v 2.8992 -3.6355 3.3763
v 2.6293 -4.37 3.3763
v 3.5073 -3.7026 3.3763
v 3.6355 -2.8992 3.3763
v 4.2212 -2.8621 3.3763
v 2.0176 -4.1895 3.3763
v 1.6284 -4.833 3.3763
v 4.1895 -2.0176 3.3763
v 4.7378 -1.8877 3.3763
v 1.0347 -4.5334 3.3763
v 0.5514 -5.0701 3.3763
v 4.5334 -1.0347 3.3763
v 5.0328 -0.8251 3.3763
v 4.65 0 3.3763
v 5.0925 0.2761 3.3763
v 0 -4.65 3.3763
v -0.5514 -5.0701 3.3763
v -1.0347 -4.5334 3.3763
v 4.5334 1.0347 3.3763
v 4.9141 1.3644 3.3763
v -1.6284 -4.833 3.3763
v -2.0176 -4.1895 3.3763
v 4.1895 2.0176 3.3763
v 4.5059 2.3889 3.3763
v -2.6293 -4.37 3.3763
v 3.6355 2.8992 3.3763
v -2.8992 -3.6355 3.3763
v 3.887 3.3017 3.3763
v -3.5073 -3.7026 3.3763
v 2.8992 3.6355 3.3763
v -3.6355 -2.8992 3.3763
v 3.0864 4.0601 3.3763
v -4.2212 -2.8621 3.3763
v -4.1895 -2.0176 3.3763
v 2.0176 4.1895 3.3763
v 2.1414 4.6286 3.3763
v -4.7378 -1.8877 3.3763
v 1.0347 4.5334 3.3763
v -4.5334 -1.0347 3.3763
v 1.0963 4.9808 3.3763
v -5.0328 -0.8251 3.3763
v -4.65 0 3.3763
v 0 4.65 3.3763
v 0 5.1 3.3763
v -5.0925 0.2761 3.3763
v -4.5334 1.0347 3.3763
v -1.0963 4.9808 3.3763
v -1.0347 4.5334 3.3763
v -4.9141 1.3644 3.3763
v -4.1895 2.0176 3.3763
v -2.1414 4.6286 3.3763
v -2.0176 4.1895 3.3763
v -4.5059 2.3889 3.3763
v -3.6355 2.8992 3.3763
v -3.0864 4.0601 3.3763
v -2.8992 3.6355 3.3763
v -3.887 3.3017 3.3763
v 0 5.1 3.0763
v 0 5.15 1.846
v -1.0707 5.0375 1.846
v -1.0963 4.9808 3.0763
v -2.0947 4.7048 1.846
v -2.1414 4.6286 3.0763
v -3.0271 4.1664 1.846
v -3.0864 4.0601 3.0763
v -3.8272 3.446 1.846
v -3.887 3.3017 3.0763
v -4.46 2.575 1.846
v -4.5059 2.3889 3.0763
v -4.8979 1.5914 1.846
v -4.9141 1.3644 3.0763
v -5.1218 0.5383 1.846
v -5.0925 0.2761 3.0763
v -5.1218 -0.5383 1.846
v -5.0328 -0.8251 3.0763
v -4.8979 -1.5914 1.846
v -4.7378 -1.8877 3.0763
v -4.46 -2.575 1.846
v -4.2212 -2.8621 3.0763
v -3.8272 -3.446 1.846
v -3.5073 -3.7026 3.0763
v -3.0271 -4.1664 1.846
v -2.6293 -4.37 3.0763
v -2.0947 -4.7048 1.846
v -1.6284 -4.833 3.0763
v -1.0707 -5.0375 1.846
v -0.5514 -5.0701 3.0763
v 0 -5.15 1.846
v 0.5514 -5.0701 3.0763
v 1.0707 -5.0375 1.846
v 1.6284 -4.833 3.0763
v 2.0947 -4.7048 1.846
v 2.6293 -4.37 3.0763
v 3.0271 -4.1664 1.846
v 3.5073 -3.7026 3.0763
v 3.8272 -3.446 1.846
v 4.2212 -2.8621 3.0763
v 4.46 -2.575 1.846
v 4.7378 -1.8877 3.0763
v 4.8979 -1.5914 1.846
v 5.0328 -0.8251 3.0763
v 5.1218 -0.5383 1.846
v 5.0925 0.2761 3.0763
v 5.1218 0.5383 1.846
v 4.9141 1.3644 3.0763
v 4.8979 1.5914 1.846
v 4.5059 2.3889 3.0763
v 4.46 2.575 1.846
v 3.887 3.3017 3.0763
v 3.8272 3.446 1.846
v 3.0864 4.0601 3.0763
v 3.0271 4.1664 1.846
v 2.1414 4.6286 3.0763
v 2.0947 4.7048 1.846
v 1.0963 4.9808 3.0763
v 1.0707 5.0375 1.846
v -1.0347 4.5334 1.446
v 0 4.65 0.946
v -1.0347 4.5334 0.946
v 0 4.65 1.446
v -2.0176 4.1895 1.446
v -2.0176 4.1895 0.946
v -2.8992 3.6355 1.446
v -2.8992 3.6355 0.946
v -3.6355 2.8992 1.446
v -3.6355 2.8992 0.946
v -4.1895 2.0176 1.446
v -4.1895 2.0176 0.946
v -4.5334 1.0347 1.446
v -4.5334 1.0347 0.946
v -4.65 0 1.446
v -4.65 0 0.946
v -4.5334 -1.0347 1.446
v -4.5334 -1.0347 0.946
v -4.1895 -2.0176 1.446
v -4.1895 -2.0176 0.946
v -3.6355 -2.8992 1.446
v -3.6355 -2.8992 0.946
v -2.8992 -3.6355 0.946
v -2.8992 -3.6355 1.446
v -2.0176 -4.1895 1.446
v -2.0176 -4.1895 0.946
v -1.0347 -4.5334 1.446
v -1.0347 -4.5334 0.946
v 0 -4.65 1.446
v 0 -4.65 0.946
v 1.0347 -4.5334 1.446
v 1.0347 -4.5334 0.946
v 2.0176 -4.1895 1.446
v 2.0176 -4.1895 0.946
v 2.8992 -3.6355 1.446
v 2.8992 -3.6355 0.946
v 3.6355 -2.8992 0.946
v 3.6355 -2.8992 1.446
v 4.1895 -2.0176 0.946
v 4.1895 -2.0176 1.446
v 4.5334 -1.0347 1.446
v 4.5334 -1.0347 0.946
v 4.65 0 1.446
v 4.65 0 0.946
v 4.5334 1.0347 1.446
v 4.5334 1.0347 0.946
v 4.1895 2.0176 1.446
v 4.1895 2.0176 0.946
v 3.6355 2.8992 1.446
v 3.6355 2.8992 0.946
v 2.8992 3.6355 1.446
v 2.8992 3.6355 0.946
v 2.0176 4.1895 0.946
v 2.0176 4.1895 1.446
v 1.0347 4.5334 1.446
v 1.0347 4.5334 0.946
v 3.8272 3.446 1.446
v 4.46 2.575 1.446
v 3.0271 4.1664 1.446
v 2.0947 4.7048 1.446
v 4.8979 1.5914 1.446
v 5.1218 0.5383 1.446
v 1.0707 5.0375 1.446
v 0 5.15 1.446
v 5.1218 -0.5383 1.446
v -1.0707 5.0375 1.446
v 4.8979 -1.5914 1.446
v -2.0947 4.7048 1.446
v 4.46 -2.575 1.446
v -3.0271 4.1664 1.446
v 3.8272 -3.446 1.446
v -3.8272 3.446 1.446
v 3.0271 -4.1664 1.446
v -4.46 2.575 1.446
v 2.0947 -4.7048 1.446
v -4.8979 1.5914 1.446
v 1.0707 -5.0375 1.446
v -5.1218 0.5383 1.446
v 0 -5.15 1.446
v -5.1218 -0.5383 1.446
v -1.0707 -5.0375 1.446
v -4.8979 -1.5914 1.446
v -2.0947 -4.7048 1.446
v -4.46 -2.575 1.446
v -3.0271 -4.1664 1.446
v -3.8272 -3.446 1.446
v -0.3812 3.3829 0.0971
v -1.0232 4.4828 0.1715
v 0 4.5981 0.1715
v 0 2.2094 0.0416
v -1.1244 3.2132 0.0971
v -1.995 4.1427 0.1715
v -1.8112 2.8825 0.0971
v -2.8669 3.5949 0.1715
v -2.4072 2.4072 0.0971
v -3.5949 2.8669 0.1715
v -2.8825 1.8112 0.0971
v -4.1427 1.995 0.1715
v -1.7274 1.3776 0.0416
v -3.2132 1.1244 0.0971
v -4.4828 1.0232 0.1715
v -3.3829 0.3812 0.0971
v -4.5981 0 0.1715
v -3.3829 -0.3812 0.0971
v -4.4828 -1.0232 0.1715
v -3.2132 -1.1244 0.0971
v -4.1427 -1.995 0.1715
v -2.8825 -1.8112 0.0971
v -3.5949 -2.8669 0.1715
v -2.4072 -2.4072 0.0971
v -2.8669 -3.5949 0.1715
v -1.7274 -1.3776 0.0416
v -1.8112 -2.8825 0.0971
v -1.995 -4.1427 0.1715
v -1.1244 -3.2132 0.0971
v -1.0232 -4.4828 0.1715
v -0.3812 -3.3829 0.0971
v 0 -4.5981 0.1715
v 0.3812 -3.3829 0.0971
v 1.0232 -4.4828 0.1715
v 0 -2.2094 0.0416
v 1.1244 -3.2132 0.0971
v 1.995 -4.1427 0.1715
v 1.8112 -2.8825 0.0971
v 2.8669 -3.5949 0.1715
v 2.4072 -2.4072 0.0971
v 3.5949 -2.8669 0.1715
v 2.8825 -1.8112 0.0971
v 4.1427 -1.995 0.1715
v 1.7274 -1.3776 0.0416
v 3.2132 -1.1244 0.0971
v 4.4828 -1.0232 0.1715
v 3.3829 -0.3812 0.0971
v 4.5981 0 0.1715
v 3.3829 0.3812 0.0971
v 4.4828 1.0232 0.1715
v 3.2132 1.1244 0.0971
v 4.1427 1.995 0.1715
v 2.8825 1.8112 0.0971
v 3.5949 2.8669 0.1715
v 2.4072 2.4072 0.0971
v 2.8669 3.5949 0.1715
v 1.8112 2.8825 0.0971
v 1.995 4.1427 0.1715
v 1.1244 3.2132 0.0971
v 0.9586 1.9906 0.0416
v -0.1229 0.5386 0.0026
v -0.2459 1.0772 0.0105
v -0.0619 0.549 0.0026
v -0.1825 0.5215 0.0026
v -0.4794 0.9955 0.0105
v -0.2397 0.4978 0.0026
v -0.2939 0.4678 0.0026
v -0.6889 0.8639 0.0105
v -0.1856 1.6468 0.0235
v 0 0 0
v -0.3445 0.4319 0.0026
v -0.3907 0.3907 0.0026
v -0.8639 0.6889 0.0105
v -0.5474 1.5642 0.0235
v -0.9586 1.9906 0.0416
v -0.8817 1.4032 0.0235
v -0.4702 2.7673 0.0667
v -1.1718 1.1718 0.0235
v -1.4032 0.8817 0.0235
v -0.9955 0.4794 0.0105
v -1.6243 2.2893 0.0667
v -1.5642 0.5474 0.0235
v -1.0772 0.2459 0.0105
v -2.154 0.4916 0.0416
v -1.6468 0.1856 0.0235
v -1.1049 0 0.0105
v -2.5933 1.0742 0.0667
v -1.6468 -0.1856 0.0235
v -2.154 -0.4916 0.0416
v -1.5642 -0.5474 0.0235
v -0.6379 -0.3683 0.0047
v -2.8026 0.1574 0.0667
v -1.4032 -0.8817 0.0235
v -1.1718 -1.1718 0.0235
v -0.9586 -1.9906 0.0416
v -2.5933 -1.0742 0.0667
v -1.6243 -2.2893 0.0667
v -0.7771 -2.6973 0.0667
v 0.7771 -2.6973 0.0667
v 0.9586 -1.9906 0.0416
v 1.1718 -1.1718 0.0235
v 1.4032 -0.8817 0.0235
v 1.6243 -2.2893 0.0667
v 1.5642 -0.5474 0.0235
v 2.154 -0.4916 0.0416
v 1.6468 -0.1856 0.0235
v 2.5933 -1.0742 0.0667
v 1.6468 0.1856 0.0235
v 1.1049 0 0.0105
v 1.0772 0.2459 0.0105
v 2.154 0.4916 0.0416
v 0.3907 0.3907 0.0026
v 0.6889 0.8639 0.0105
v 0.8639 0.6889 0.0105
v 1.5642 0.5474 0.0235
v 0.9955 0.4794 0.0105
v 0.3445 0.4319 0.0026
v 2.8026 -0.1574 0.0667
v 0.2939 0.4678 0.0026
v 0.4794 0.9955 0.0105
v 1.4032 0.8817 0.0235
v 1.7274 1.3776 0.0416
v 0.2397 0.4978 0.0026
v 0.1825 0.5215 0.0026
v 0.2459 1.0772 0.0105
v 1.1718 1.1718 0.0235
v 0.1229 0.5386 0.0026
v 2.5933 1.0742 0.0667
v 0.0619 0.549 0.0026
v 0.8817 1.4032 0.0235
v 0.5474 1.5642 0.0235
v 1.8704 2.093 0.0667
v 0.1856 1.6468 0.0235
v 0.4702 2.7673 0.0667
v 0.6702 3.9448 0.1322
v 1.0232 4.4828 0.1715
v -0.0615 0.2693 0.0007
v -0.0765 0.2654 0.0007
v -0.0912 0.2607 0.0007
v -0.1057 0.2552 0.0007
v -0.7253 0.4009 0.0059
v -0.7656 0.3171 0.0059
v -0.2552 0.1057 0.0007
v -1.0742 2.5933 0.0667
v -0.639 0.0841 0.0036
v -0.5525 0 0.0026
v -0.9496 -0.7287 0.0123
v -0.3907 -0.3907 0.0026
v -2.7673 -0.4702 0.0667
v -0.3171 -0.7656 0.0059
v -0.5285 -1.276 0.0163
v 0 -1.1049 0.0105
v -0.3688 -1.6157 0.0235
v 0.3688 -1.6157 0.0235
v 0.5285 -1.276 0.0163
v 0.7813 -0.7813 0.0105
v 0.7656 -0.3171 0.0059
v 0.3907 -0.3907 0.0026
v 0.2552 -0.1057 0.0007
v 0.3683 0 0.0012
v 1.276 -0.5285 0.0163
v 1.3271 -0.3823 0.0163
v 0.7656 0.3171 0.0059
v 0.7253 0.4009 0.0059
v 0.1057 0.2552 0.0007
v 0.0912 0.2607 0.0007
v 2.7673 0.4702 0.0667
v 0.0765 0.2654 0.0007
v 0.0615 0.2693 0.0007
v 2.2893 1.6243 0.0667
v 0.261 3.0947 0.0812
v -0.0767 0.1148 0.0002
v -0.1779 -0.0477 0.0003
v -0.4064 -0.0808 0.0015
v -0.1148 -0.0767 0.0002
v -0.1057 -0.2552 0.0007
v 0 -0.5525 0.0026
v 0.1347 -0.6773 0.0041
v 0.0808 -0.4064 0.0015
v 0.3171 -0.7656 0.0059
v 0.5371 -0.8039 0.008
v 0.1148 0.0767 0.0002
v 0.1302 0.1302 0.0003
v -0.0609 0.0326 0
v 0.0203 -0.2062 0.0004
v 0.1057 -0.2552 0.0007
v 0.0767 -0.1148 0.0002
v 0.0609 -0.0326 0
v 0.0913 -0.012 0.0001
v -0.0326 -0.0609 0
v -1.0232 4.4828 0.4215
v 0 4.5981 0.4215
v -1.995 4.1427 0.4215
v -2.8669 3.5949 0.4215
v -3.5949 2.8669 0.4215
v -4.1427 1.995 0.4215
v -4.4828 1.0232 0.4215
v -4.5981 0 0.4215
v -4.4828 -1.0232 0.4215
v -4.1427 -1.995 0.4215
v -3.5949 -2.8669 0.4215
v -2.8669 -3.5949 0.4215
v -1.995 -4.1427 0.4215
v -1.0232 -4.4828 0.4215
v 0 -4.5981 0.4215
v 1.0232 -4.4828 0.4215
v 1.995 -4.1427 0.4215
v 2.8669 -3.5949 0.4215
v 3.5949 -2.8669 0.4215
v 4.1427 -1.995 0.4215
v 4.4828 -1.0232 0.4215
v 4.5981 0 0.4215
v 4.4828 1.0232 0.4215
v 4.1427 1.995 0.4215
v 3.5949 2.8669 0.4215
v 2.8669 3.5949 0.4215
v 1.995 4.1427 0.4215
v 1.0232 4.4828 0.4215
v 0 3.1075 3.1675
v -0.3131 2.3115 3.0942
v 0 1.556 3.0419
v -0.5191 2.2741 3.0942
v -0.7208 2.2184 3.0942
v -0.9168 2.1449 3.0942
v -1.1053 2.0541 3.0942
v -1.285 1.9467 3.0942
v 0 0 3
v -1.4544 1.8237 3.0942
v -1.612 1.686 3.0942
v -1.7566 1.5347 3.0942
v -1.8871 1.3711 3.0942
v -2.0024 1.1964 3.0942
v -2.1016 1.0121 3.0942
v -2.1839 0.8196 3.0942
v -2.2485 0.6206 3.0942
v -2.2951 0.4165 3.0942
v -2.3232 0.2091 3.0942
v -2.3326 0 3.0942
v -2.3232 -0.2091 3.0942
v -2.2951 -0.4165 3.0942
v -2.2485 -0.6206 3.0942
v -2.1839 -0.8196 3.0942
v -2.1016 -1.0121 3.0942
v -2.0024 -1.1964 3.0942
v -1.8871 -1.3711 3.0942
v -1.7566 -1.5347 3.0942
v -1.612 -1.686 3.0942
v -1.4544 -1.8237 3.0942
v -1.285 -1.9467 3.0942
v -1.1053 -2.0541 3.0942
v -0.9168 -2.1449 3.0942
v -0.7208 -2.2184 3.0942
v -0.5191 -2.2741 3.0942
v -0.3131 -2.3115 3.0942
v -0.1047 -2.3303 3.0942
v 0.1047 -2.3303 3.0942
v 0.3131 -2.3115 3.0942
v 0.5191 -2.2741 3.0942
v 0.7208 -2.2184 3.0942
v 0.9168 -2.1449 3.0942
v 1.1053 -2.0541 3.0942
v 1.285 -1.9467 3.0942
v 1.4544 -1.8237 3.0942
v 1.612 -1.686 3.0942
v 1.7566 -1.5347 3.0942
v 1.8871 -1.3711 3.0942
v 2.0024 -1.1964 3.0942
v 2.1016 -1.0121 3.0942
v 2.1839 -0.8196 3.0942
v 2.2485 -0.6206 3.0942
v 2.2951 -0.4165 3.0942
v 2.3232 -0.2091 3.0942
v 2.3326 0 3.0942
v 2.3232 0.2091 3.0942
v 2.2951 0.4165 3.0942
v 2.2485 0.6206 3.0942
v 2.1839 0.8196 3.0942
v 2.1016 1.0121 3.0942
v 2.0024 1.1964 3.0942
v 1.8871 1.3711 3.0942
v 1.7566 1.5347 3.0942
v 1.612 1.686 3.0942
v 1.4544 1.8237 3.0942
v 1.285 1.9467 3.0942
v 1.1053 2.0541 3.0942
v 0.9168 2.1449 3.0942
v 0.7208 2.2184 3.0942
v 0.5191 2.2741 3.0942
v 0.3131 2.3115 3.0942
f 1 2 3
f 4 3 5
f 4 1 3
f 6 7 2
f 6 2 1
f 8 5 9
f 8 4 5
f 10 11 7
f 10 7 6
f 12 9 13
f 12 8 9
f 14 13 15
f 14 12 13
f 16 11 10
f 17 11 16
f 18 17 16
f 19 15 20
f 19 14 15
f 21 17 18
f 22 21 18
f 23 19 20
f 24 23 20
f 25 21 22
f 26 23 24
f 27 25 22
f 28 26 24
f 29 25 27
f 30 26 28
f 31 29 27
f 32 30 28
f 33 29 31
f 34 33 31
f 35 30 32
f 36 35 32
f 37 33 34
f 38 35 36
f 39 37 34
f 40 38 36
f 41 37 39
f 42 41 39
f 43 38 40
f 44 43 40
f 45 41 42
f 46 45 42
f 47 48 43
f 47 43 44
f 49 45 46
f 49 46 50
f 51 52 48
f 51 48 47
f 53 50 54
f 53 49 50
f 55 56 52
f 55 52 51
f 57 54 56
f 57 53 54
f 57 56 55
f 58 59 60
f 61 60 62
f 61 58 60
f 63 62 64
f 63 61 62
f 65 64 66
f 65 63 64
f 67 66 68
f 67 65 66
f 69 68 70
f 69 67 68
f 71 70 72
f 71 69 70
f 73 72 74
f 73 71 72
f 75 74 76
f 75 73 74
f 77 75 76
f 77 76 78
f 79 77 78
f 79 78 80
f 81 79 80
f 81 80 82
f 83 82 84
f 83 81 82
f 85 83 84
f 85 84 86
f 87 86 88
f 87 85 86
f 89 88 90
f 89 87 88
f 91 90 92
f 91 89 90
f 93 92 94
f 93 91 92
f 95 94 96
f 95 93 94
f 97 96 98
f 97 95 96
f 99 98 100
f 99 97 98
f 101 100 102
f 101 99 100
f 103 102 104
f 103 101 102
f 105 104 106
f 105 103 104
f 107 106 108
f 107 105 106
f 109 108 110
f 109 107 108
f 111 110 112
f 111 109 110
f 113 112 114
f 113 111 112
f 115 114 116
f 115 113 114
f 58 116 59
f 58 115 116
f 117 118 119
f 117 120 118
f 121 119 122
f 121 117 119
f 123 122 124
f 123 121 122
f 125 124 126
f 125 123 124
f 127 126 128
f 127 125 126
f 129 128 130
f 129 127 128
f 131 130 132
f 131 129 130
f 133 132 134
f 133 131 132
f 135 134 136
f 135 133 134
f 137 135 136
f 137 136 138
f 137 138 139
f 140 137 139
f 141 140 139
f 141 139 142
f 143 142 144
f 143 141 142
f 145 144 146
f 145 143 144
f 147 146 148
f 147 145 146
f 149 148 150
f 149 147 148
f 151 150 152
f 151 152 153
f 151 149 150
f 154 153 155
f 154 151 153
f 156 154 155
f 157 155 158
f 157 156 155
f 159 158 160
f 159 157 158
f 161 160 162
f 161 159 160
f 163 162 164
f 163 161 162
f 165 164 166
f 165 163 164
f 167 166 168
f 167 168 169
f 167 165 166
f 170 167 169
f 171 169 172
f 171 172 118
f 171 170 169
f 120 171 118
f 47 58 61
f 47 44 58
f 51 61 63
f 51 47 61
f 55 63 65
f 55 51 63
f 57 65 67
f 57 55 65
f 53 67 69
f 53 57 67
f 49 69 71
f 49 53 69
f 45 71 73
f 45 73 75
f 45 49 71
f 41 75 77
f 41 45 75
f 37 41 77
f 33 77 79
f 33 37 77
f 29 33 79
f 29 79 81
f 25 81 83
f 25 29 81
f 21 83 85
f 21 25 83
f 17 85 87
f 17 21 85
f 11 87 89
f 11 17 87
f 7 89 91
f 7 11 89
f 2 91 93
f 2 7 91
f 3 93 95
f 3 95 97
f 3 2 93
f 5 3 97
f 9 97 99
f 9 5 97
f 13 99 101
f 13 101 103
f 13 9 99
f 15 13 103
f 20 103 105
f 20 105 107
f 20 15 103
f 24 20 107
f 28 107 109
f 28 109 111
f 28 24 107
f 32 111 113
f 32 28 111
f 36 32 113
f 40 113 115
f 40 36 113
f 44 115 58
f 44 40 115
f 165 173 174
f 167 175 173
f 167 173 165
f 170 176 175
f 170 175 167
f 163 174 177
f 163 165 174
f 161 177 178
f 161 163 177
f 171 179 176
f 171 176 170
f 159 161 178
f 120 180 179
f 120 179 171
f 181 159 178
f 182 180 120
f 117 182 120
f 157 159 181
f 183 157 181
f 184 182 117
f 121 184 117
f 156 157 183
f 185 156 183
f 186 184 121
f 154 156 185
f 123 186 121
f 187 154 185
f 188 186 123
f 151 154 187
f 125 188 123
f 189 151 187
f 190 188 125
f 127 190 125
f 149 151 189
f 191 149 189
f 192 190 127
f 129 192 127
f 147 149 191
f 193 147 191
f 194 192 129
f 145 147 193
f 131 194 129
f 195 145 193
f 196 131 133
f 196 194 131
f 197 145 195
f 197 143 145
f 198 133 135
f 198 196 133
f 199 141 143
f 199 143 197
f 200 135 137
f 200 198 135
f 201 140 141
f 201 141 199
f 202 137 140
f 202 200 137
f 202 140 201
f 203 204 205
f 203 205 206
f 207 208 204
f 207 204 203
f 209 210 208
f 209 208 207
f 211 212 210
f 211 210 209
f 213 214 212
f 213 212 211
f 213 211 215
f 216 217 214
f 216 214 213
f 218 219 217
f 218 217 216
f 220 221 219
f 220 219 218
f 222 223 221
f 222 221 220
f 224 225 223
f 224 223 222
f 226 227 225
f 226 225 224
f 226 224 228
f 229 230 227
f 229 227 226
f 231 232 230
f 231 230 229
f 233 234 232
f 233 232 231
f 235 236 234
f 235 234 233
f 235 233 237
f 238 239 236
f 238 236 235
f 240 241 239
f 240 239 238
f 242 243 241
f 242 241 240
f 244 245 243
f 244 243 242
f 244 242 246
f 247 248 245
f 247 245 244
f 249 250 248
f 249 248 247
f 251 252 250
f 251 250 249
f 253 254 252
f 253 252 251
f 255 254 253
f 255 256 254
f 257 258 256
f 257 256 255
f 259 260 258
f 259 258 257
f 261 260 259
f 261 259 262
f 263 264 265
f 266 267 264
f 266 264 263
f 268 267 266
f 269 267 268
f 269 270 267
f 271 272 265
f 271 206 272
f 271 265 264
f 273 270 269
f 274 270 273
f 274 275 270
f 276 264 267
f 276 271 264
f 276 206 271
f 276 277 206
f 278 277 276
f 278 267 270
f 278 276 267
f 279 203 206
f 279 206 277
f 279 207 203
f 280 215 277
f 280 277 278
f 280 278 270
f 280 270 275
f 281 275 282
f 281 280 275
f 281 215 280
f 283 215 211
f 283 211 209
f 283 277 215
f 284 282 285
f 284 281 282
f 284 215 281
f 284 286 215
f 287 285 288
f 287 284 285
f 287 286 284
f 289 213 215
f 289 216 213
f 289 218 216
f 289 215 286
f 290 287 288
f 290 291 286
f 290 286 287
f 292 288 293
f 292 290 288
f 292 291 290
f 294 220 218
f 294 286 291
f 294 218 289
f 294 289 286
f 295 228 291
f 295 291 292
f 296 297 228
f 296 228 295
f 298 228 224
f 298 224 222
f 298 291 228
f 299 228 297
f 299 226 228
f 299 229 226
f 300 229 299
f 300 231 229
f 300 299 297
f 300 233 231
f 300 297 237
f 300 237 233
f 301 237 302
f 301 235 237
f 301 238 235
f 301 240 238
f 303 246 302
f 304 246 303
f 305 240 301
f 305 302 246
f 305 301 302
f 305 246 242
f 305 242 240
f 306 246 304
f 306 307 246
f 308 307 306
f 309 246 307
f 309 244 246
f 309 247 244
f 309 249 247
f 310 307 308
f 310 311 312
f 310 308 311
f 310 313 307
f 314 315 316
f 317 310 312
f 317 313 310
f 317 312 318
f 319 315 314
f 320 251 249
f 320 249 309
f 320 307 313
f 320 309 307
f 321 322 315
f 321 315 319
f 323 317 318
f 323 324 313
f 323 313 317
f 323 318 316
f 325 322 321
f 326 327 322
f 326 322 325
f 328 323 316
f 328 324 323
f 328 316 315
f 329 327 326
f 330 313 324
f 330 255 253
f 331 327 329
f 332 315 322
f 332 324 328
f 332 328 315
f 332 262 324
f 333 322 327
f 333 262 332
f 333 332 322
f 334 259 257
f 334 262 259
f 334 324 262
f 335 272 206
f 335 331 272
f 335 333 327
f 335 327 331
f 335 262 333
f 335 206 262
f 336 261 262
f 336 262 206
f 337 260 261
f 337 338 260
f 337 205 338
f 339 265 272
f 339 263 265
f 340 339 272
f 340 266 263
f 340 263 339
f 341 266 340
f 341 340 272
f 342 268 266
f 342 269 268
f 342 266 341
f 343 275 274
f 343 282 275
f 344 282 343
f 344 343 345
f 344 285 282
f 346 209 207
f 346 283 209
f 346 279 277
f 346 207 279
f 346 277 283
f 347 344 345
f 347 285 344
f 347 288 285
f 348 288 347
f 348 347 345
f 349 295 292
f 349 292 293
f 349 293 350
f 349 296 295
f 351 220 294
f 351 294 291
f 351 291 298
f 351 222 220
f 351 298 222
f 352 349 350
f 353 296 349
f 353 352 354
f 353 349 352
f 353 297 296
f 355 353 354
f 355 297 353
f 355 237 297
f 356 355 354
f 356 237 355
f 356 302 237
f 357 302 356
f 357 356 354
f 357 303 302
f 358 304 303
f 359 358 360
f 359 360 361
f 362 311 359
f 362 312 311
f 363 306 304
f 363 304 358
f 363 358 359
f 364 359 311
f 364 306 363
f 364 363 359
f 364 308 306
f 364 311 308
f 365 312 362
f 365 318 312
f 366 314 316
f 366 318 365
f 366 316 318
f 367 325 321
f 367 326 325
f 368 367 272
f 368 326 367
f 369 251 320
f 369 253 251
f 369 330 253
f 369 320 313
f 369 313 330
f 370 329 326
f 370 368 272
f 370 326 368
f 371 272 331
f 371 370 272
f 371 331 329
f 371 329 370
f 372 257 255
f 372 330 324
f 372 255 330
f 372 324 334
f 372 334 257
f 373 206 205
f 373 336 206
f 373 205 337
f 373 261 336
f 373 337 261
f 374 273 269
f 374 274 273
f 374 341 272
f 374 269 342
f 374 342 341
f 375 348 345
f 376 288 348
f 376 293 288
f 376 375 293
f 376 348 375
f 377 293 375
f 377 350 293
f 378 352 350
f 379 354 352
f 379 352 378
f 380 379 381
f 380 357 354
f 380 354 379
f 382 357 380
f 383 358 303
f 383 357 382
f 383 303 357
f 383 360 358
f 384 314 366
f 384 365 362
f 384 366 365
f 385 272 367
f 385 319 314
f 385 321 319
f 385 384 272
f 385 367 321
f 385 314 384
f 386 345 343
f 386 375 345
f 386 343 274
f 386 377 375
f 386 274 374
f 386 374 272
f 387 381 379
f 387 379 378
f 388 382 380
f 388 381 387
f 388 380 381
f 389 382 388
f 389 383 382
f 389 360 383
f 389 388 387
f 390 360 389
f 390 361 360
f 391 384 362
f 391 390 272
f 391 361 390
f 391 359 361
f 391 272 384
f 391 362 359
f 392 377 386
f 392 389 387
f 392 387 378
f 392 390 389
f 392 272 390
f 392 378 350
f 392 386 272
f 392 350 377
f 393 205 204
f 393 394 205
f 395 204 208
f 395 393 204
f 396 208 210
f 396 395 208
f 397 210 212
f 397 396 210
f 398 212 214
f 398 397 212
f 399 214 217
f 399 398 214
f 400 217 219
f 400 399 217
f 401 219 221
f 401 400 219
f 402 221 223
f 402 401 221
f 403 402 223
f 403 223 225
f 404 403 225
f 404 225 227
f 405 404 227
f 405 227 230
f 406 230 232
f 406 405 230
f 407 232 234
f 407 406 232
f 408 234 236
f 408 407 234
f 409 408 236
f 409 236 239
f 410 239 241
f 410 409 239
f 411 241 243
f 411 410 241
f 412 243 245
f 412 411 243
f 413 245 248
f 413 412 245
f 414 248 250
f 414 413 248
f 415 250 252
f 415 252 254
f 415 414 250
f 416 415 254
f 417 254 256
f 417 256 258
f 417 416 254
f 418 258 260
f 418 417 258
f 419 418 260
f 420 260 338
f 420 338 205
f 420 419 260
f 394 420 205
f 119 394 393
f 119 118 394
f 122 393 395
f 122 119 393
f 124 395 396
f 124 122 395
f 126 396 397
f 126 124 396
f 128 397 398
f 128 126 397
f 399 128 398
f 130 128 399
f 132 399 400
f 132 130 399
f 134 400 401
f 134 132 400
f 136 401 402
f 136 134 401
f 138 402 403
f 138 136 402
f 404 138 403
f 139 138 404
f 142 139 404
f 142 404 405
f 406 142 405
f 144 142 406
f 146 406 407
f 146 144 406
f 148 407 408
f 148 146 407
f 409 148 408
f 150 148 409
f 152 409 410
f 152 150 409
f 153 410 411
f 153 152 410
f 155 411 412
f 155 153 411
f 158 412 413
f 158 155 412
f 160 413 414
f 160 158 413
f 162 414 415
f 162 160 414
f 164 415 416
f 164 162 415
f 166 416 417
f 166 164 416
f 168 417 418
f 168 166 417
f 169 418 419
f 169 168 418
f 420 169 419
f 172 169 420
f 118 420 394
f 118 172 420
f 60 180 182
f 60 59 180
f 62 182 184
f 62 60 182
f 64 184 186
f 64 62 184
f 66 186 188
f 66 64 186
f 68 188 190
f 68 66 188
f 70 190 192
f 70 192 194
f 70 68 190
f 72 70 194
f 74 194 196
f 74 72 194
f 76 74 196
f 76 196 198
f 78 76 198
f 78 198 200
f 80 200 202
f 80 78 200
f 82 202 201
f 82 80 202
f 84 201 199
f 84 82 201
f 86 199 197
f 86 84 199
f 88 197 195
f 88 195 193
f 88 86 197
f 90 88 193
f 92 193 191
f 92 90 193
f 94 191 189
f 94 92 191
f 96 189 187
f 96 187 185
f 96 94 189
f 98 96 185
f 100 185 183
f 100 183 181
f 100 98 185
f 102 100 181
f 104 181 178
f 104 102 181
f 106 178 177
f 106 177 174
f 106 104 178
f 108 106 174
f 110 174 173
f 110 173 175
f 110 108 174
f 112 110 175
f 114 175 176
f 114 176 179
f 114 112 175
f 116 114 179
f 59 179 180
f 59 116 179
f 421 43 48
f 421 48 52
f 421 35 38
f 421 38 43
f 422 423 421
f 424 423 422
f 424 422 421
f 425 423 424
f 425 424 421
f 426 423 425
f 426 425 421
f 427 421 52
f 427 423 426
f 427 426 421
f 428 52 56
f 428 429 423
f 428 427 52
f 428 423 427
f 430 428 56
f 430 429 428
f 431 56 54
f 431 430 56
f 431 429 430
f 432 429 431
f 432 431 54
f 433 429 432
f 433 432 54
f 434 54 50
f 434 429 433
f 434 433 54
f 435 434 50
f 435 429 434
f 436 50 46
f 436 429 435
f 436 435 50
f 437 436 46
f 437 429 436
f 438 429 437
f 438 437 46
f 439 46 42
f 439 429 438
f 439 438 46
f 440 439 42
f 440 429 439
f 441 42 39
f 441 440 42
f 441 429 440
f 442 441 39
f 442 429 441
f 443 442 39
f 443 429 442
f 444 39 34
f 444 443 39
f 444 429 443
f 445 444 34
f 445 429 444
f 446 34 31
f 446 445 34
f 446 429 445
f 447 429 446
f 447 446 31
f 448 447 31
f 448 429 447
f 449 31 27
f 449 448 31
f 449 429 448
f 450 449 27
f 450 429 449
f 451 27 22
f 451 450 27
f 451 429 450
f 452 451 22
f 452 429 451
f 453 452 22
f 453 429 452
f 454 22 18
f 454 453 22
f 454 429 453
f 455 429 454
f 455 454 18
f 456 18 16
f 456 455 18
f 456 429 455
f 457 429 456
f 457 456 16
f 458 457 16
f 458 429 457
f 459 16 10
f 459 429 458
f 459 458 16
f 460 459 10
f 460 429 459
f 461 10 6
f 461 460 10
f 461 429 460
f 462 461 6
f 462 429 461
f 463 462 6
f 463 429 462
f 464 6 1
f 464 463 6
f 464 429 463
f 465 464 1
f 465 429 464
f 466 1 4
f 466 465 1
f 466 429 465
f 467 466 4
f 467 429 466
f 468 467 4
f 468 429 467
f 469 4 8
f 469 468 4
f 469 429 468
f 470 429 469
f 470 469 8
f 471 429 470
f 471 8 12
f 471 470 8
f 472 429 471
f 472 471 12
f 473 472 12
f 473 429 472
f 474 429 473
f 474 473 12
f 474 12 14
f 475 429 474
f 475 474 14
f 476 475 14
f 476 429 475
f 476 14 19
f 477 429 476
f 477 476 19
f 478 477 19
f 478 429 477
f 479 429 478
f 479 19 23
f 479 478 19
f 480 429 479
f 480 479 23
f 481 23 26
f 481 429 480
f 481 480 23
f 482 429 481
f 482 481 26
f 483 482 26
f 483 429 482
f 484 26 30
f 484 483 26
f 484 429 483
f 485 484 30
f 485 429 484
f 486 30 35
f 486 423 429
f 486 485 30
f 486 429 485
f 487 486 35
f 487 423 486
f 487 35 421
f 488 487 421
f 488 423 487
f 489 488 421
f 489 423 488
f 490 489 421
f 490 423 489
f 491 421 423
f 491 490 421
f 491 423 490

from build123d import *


with BuildPart() as part:
    # Sketch1 → Revolve1 (revolve)
    with BuildSketch(Plane(origin=(0, 0, 0), x_dir=(0, 0, -1), z_dir=(1, 0, 0))):
        with BuildLine():
            Line((-1.445971311, 4.65), (-1.445971311, 5.15))
            Line((-1.445971311, 5.15), (-1.845971311, 5.15))
            Line((-1.845971311, 5.15), (-3.076316722, 5.1))
            Line((-3.076316722, 5.1), (-3.376316722, 5.1))
            Line((-3.376316722, 5.1), (-3.376316722, 4.65))
            ThreePointArc((-3.376316722, 4.65), (-3.094232719, 2.332601245), (-3, 0))
            Line((-3, 0), (0, 0))
            add(Edge.make_bspline(
                [(0, 0), (-2.675e-06, 0.01666667), (-8.026e-06, 0.050000025), (-8.7895e-05, 0.100000022), (-0.000180393, 0.150000063), (-0.000330536, 0.200000094), (-0.000537467, 0.250000053), (-0.000759597, 0.300000137), (-0.001044147, 0.350000117), (-0.001363821, 0.400000131), (-0.001720577, 0.450000201), (-0.00213388, 0.500000168), (-0.00258391, 0.550000181), (-0.003070489, 0.60000027), (-0.003614151, 0.650000216), (-0.004192925, 0.700000245), (-0.004814168, 0.750000245), (-0.005470422, 0.80000036), (-0.006184171, 0.850000281), (-0.006932922, 0.900000314), (-0.007724172, 0.95000031), (-0.008550424, 1.000000449), (-0.009434173, 1.050000346), (-0.010352924, 1.100000384), (-0.011314174, 1.150000375), (-0.012310428, 1.200000538), (-0.013364176, 1.250000411), (-0.014452926, 1.300000453), (-0.015584178, 1.35000044), (-0.016750427, 1.400000627), (-0.017974197, 1.450000475), (-0.019232861, 1.500000524), (-0.020534438, 1.550000498), (-0.021869472, 1.600000744), (-0.023267779, 1.650000343), (-0.024679493, 1.700000784), (-0.026154367, 1.750000567), (-0.027663148, 1.800000617), (-0.029213151, 1.850000635), (-0.030804364, 1.900000609), (-0.03242952, 1.9500009), (-0.034117709, 2.000000417), (-0.035819762, 2.050000932), (-0.037583409, 2.100000712), (-0.039386752, 2.150000479), (-0.041209716, 2.200000999), (-0.043094579, 2.250000713), (-0.045012147, 2.300000823), (-0.046977008, 2.350000513), (-0.048959975, 2.400001074), (-0.051003318, 2.450000827), (-0.053086955, 2.500000545), (-0.055189036, 2.55000118), (-0.057357151, 2.60000056), (-0.059542551, 2.650000917), (-0.061772874, 2.700000922), (-0.064046189, 2.750000631), (-0.06634257, 2.800000963), (-0.068683782, 2.850000923), (-0.071062569, 2.900000997), (-0.073486209, 2.950000672), (-0.075932824, 3.000001012), (-0.078422781, 3.050001033), (-0.080956347, 3.100000695), (-0.083512081, 3.150001096), (-0.086115631, 3.200000753), (-0.088745651, 3.250000758), (-0.091402026, 3.300001143), (-0.09410657, 3.350000729), (-0.096831979, 3.400001174), (-0.099605857, 3.450000789), (-0.102404883, 3.500000851), (-0.105234896, 3.55000086), (-0.108095823, 3.600000814), (-0.110982119, 3.650001235), (-0.113916085, 3.70000082), (-0.116873864, 3.750000961), (-0.119868764, 3.800000474), (-0.122871331, 3.850001333), (-0.125926314, 3.90000084), (-0.129003762, 3.950001006), (-0.132118968, 4.00000048), (-0.135240638, 4.05000143), (-0.1384189, 4.100000495), (-0.141604042, 4.150001022), (-0.144825285, 4.200000953), (-0.148075192, 4.250000967), (-0.151354329, 4.300001033), (-0.154667867, 4.350000584), (-0.157994497, 4.400001036), (-0.16135453, 4.450001045), (-0.164747775, 4.500000605), (-0.168111531, 4.549367846), (-0.170360364, 4.582067388), (-0.17146867, 4.598100522)],
                knots=[0, 0, 0, 0, 0.010742815, 0.02148564, 0.032228476, 0.042971338, 0.053714238, 0.064457166, 0.075200149, 0.085943183, 0.096686276, 0.107429451, 0.118172701, 0.128916031, 0.139659472, 0.150403009, 0.161146649, 0.171890399, 0.182634296, 0.193378319, 0.204122474, 0.214866768, 0.225611246, 0.236355879, 0.247100673, 0.257845636, 0.268590819, 0.279336185, 0.290081743, 0.300827498, 0.311573509, 0.322319734, 0.333066179, 0.34381285, 0.354559815, 0.365306961, 0.376054417, 0.386802129, 0.397550104, 0.408298349, 0.41904687, 0.429795747, 0.440544842, 0.451294309, 0.462044083, 0.47279409, 0.483544495, 0.494295227, 0.505046292, 0.515797611, 0.526549363, 0.537301469, 0.548053845, 0.558806679, 0.569559793, 0.580313286, 0.591067166, 0.60182134, 0.612575913, 0.62333089, 0.63408628, 0.644841984, 0.655598111, 0.666354669, 0.677111555, 0.687868884, 0.698626549, 0.709384555, 0.720143021, 0.730901836, 0.741661123, 0.752420769, 0.763180777, 0.773941152, 0.784701896, 0.79546314, 0.806224762, 0.816986768, 0.827749031, 0.838511813, 0.84927499, 0.860038566, 0.870802409, 0.881566792, 0.892331448, 0.903096516, 0.913862001, 0.924627905, 0.935394234, 0.946160847, 0.95692789, 0.967695368, 0.978463137, 0.988822257, 0.988822257, 0.988822257, 0.988822257], degree=3))
            Line((-0.17146867, 4.598100522), (-0.42146867, 4.598100522))
            Line((-0.42146867, 4.598100522), (-0.945971311, 4.65))
            Line((-0.945971311, 4.65), (-1.445971311, 4.65))
        make_face()
    revolve(axis=Axis((0, 0, -5.189127774), (0, 0, 1)))


solid = part.part
